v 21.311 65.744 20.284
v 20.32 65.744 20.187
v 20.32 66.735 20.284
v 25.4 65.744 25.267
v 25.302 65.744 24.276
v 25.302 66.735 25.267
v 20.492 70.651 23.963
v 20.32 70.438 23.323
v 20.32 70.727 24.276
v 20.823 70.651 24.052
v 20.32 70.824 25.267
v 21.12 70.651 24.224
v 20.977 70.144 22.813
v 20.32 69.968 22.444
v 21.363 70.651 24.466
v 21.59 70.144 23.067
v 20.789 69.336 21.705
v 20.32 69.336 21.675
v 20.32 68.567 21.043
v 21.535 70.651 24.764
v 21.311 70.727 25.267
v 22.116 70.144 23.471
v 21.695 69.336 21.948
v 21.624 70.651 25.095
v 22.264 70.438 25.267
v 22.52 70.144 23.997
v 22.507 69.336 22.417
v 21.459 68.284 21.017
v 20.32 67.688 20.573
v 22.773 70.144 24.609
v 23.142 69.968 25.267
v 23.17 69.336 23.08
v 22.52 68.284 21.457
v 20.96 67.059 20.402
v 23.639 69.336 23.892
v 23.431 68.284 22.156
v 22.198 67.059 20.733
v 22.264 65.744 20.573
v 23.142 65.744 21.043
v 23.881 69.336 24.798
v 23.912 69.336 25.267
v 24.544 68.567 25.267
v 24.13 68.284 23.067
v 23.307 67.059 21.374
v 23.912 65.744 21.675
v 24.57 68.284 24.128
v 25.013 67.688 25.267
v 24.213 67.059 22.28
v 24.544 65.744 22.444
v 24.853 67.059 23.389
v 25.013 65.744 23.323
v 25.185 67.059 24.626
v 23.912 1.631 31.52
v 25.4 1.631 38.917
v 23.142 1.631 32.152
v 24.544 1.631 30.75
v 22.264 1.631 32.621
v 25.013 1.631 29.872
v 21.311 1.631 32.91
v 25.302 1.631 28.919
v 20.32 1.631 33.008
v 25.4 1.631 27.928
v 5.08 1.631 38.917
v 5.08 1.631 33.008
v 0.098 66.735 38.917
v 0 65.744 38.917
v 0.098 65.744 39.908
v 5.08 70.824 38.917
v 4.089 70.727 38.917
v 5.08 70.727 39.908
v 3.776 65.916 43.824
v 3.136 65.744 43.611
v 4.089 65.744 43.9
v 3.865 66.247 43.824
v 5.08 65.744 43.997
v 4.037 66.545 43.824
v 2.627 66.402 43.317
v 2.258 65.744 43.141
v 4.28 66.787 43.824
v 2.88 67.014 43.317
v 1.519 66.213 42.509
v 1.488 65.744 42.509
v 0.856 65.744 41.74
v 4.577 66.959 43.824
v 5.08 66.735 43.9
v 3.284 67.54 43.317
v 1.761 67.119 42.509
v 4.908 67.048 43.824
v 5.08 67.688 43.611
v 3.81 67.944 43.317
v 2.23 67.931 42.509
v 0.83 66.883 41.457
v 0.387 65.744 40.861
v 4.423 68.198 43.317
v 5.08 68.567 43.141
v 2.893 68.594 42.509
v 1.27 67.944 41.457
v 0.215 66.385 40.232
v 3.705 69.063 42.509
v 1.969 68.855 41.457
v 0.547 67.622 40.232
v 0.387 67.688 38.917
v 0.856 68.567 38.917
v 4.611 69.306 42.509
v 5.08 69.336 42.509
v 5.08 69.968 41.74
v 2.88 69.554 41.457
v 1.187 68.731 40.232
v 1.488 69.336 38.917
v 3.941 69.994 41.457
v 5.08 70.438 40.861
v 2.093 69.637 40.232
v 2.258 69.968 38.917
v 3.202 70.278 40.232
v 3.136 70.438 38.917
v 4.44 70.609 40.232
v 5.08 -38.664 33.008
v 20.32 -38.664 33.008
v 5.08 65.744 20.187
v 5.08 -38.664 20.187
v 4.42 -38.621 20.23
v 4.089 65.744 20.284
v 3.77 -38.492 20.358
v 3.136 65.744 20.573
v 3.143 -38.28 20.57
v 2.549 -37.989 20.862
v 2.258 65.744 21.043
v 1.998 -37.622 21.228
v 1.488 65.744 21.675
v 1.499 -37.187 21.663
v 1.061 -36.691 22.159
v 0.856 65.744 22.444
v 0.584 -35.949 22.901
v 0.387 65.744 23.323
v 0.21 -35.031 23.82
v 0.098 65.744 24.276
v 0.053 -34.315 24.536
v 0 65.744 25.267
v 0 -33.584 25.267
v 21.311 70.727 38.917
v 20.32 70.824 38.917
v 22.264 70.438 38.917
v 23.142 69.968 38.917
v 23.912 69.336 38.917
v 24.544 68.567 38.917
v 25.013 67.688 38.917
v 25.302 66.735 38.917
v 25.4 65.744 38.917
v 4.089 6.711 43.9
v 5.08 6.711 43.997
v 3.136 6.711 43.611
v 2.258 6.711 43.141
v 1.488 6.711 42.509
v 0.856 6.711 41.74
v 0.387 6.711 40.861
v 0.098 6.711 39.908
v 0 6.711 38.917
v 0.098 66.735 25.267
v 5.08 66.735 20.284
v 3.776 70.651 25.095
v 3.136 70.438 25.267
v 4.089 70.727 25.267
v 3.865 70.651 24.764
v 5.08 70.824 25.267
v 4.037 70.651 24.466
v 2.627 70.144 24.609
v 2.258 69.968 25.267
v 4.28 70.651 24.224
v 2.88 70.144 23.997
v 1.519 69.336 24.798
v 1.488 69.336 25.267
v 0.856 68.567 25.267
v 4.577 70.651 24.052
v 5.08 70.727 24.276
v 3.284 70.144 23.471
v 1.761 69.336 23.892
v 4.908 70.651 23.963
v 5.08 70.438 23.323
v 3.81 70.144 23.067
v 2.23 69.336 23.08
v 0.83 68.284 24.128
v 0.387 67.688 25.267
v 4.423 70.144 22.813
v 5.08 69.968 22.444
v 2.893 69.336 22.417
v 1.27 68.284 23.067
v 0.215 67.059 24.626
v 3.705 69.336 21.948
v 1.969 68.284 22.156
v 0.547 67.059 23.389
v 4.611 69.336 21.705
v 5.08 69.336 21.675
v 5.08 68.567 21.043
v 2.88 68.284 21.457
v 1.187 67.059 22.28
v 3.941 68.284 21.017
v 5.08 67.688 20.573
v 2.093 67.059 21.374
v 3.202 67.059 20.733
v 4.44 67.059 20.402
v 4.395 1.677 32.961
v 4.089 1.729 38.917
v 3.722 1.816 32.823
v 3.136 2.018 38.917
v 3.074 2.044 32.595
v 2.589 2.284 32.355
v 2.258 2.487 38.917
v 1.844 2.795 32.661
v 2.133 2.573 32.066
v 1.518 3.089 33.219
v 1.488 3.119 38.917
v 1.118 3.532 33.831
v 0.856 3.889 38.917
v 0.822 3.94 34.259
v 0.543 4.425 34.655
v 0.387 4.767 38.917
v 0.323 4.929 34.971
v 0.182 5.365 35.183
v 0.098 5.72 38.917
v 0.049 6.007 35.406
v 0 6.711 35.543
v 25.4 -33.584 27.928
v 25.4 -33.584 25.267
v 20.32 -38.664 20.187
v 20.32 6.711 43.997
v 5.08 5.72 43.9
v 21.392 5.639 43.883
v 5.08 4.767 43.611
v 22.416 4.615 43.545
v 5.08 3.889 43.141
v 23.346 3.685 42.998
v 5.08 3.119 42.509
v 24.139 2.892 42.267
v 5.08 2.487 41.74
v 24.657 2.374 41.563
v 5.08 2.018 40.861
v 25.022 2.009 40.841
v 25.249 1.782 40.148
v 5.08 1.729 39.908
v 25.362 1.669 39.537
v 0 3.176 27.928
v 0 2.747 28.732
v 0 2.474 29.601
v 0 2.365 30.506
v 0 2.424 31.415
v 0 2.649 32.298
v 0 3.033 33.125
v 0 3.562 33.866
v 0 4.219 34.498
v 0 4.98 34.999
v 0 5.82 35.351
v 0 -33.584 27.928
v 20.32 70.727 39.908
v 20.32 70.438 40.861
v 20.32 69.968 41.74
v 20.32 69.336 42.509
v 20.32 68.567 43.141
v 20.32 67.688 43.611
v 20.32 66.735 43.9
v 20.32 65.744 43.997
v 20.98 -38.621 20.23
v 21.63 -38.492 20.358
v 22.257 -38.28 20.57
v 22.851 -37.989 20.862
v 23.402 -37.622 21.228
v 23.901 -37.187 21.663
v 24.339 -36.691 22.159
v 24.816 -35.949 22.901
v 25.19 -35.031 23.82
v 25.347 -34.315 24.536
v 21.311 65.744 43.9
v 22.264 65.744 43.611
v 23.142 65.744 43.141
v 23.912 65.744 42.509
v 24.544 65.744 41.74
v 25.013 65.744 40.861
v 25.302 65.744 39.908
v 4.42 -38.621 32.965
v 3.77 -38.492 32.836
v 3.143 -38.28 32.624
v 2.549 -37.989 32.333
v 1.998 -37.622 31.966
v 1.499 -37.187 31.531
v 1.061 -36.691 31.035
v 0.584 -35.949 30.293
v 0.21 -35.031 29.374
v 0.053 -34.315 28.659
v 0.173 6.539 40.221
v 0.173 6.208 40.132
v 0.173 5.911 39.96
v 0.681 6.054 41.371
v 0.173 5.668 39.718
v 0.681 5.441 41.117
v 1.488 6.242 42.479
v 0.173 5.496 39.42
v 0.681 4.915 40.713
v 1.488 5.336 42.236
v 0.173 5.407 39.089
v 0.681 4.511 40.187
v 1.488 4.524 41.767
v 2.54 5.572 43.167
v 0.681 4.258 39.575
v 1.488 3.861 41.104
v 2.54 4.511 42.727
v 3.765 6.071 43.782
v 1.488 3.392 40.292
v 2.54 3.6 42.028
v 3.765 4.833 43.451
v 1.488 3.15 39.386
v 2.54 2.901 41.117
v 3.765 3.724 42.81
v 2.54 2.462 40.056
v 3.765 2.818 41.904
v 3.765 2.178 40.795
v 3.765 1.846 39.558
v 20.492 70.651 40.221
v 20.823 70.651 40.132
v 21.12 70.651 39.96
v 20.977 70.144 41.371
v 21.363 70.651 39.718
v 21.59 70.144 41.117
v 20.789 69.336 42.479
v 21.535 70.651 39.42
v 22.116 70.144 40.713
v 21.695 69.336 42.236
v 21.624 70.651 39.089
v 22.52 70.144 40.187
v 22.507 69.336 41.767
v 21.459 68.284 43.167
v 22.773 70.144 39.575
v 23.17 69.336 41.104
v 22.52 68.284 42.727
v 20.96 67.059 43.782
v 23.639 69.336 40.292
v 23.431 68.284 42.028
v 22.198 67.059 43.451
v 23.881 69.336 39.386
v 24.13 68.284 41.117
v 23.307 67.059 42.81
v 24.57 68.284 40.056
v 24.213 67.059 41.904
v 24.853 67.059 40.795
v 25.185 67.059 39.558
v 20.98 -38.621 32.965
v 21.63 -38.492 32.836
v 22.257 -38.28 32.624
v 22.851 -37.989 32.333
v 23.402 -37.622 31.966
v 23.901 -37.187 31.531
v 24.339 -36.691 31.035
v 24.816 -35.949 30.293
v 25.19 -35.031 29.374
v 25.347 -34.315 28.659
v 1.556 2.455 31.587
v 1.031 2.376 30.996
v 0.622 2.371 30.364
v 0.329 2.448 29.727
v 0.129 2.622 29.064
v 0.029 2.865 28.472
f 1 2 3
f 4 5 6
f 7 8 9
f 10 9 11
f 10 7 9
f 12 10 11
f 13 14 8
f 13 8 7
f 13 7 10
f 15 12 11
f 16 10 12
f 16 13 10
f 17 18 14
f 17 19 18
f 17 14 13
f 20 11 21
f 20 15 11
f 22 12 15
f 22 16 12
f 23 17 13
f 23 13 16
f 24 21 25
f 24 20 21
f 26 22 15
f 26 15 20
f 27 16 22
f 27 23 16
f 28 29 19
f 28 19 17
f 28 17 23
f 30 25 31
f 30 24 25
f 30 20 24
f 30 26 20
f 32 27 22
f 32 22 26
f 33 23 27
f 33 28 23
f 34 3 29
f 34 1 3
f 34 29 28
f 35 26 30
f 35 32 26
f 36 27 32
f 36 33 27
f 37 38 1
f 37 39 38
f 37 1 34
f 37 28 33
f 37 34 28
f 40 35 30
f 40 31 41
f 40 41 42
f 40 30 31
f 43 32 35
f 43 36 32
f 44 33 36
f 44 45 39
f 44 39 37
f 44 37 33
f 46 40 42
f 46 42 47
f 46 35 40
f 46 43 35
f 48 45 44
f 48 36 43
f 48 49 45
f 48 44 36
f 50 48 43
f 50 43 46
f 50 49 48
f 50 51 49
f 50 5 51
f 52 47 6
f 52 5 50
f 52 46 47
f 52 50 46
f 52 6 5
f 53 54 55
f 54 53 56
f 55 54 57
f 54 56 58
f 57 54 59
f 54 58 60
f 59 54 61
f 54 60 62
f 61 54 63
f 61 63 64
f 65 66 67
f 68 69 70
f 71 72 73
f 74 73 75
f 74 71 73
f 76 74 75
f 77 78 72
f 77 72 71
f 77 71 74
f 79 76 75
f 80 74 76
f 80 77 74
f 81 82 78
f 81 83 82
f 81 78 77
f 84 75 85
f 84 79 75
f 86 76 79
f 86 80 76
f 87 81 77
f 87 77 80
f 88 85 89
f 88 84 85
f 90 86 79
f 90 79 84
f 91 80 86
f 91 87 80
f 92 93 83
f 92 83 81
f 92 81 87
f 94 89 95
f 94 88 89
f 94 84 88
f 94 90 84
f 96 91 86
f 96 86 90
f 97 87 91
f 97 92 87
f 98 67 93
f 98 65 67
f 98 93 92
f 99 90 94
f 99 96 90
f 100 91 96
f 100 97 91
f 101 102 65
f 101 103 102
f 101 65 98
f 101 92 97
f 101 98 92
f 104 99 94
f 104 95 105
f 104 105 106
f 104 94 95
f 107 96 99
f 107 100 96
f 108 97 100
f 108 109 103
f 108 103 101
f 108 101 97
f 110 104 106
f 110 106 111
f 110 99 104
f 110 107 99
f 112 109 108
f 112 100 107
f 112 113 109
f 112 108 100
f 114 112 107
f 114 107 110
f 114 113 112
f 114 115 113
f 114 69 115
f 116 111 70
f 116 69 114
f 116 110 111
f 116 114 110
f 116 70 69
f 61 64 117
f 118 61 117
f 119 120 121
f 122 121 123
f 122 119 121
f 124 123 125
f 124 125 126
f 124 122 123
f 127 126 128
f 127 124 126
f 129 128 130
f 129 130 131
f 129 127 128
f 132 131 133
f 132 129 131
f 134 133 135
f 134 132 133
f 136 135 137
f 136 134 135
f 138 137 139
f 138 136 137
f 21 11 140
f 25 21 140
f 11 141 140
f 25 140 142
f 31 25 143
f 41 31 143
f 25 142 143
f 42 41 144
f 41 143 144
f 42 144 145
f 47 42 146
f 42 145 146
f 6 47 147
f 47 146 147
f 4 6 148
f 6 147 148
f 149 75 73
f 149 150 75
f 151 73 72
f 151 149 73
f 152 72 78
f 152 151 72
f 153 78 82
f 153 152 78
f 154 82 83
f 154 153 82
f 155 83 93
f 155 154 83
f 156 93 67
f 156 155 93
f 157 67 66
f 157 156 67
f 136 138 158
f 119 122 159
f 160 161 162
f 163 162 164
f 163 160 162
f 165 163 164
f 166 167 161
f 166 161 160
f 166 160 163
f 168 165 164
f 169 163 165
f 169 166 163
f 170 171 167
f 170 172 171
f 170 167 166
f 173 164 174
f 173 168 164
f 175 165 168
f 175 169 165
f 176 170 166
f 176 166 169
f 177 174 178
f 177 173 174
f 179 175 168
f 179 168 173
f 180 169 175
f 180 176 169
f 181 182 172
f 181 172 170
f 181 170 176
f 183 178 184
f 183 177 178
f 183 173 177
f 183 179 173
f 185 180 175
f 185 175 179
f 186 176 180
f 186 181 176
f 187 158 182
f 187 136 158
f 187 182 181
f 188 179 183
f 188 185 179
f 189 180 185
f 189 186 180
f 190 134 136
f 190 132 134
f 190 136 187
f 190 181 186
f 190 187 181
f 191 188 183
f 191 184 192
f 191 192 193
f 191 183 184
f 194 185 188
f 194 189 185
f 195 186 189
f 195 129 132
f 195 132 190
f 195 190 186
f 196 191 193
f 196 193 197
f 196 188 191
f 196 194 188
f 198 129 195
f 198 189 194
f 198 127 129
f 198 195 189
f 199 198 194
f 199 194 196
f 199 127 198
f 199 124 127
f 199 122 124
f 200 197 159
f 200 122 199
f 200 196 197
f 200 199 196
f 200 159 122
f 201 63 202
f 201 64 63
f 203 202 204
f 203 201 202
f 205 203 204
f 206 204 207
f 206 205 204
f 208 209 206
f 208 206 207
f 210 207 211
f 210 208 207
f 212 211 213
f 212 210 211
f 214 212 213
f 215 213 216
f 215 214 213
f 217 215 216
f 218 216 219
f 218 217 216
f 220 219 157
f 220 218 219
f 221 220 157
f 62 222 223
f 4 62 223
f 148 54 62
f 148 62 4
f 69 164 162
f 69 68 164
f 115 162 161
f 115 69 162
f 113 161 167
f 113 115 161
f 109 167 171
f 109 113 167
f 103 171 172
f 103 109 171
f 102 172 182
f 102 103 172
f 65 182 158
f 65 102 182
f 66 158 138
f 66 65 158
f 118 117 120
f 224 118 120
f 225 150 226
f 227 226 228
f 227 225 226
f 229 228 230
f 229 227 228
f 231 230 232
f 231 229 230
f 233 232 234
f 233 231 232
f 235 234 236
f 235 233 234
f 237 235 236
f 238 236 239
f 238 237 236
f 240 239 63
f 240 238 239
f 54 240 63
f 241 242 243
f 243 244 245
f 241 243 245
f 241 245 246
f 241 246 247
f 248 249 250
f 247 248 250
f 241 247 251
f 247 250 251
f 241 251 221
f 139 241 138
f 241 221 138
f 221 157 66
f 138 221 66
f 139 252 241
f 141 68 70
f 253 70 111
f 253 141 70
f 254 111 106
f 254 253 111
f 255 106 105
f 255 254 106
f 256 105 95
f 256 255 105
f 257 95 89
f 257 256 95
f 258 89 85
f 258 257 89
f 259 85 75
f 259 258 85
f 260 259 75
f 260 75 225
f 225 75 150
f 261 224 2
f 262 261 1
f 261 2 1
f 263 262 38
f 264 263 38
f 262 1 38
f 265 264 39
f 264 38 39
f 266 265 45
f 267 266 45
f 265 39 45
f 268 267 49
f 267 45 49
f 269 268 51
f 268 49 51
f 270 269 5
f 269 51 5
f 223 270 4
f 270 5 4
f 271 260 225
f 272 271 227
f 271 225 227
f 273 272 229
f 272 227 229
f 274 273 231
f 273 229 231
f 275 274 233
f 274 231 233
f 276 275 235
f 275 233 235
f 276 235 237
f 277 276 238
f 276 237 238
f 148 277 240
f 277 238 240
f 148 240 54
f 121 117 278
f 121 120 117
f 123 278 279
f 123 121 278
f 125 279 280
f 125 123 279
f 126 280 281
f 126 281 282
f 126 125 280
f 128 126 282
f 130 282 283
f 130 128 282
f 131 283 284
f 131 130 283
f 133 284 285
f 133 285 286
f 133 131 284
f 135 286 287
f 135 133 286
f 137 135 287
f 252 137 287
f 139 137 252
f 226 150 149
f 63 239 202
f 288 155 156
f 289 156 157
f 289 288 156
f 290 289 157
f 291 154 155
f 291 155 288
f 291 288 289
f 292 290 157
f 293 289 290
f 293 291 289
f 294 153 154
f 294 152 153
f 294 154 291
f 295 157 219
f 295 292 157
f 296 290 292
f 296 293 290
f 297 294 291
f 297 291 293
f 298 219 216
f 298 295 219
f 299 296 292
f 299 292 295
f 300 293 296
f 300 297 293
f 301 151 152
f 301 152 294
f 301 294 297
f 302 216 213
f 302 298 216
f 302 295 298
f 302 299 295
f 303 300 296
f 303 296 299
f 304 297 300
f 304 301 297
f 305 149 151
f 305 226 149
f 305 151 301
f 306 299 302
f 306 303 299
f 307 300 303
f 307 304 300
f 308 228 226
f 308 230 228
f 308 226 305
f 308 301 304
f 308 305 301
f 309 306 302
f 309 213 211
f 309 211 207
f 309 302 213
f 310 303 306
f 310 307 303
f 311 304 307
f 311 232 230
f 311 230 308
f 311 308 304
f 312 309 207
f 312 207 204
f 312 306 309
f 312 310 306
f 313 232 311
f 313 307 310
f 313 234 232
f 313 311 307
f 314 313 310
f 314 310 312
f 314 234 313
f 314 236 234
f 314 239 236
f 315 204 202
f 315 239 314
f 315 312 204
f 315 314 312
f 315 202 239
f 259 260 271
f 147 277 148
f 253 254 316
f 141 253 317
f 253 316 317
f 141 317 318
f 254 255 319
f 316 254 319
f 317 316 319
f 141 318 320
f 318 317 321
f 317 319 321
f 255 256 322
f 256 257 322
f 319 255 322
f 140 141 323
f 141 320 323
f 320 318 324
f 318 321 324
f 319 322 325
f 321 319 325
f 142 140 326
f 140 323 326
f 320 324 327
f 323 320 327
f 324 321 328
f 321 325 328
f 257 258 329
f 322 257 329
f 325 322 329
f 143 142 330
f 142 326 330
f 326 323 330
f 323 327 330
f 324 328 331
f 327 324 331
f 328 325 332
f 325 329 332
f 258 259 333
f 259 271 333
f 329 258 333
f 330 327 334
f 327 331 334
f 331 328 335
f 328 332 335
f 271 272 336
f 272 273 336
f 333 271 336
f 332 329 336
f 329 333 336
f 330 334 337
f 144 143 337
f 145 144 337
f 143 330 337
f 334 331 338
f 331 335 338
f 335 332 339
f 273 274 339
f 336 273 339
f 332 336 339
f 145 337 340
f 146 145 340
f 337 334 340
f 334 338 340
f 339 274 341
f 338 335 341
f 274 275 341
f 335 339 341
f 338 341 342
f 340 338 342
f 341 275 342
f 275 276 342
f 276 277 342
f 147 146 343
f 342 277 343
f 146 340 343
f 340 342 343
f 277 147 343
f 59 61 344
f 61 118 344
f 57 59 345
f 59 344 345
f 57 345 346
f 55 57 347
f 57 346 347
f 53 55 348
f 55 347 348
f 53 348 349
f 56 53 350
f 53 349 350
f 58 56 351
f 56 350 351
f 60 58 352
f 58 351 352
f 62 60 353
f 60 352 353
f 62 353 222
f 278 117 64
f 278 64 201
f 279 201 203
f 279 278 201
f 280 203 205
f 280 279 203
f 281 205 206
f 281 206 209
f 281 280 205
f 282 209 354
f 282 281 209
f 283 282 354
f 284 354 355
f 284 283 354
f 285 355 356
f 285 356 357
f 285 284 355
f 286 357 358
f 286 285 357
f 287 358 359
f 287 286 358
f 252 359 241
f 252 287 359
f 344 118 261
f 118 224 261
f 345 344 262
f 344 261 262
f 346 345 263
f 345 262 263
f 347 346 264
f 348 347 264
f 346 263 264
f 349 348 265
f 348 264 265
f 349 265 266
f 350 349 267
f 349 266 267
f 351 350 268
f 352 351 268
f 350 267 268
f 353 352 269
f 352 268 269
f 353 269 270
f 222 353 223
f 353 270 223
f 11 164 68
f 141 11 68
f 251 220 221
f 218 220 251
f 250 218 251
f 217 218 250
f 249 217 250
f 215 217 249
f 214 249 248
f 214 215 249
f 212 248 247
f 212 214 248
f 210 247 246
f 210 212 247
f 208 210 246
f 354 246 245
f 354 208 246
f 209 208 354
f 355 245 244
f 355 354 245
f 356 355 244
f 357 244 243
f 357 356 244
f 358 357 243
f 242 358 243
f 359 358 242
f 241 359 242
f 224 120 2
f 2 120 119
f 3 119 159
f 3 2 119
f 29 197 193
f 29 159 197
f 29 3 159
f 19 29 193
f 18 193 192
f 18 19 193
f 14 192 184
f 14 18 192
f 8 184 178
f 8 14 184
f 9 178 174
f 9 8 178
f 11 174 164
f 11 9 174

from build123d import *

# Parameters (mm, degrees)
F1_DEPTH = 25.4
F2_R     = 5.08
F3_R     = 6.157745
F3_W     = 0.458606
F3_H     = 2.747152
F3_R_2   = 4.937025
F4_DEPTH = 25.4


with BuildPart() as f1:
    # F0 (on Right) → F1 (new body)
    with BuildSketch(Plane.YZ):
        Polygon((1.631016, 33.007801), (-38.663846, 33.007801), (-38.663846, 20.186709), (70.824213, 20.186709), (70.824213, 43.99731), (55.357497, 43.99731), (1.631016, 43.99731), align=None)
    extrude(amount=F1_DEPTH)

    # F2
    f2_edges = [f1.edges().sort_by_distance(p)[0] for p in [
        (25.4, 36.227615, 43.99731),
        (25.4, -18.516415, 33.007801),
        (12.7, 1.631016, 43.99731),
        (0, -18.516415, 33.007801),
        (25.4, -38.663846, 26.597255),
        (0, -38.663846, 26.597255),
        (25.4, 16.080184, 20.186709),
        (0, 16.080184, 20.186709),
        (0, 70.824213, 32.09201),
        (0, 36.227615, 43.99731),
        (0, 1.631016, 38.502555),
        (12.7, 70.824213, 20.186709),
        (12.7, 70.824213, 43.99731),
        (25.4, 70.824213, 32.09201),
    ]]
    fillet(f2_edges, radius=F2_R)

    # F3 (on face) → F4 (join)
    with BuildSketch(Plane.YZ.offset(25.4)):
        with Locations((56.599278, 32.443203)):
            Circle(F3_R)
        with Locations((56.828581, 31.069627)):
            Rectangle(F3_W, F3_H, mode=Mode.SUBTRACT)
        with Locations((7.300105, 30.641174)):
            Circle(F3_R_2)
    extrude(amount=-F4_DEPTH)


solid = f1.part
